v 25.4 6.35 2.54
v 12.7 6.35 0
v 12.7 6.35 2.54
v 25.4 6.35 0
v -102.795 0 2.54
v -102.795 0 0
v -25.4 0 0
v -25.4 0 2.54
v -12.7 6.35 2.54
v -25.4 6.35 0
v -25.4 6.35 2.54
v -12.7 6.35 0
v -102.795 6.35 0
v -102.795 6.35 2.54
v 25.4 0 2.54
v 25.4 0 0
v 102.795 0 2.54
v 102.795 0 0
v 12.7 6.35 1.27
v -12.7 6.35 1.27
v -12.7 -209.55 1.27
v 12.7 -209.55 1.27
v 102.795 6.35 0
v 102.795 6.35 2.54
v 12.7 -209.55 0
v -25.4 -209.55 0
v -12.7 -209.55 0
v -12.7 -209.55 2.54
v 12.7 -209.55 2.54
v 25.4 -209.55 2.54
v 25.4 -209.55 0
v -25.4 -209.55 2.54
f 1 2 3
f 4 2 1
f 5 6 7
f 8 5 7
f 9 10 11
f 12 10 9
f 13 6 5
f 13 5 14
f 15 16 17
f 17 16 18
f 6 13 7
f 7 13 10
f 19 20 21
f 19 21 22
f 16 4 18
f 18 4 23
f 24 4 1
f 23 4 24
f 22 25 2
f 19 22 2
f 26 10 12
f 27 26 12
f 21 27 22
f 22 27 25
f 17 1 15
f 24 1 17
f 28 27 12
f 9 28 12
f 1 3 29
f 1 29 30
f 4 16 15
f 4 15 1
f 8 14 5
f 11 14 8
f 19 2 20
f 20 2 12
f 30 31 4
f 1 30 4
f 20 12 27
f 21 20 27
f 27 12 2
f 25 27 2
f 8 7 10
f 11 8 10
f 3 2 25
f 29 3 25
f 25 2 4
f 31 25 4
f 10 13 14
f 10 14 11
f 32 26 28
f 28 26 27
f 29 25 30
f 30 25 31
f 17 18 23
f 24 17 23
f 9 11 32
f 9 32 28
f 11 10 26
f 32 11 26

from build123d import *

# Parameters (mm, degrees)
F0_W     = 12.7
F0_H     = 6.35
F0_H_2   = 209.55
F1_DEPTH = 2.54
F0_W_2   = 77.395382
F2_DEPTH = 2.54
F3_DEPTH = 1.27


with BuildPart() as f1:
    # F0 (on Top) → F1 (new body)
    with BuildSketch(Plane.XY):
        with Locations((-19.05, 3.175)):
            Rectangle(F0_W, F0_H)
        with Locations((19.05, 3.175)):
            Rectangle(F0_W, F0_H)
        with Locations((19.05, -104.775)):
            Rectangle(F0_W, F0_H_2)
        with Locations((-19.05, -104.775)):
            Rectangle(F0_W, F0_H_2)
    extrude(amount=F1_DEPTH)


with BuildPart() as f2:
    # F0 (on Top) → F2 (new body)
    with BuildSketch(Plane.XY):
        with Locations((64.097691, 3.175)):
            Rectangle(F0_W_2, F0_H)
        with Locations((-64.097691, 3.175)):
            Rectangle(F0_W_2, F0_H)
    extrude(amount=F2_DEPTH)


with BuildPart() as f3:
    # F0 (on Top) → F3 (new body)
    with BuildSketch(Plane.XY):
        Polygon((-12.7, 0), (0, 0), (12.7, 0), (12.7, 6.35), (-12.7, 6.35), align=None)
        Polygon((12.7, 0), (0, 0), (-12.7, 0), (-12.7, -209.55), (12.7, -209.55), align=None)
    extrude(amount=F3_DEPTH)


solid = Compound([f1.part, f2.part, f3.part])
